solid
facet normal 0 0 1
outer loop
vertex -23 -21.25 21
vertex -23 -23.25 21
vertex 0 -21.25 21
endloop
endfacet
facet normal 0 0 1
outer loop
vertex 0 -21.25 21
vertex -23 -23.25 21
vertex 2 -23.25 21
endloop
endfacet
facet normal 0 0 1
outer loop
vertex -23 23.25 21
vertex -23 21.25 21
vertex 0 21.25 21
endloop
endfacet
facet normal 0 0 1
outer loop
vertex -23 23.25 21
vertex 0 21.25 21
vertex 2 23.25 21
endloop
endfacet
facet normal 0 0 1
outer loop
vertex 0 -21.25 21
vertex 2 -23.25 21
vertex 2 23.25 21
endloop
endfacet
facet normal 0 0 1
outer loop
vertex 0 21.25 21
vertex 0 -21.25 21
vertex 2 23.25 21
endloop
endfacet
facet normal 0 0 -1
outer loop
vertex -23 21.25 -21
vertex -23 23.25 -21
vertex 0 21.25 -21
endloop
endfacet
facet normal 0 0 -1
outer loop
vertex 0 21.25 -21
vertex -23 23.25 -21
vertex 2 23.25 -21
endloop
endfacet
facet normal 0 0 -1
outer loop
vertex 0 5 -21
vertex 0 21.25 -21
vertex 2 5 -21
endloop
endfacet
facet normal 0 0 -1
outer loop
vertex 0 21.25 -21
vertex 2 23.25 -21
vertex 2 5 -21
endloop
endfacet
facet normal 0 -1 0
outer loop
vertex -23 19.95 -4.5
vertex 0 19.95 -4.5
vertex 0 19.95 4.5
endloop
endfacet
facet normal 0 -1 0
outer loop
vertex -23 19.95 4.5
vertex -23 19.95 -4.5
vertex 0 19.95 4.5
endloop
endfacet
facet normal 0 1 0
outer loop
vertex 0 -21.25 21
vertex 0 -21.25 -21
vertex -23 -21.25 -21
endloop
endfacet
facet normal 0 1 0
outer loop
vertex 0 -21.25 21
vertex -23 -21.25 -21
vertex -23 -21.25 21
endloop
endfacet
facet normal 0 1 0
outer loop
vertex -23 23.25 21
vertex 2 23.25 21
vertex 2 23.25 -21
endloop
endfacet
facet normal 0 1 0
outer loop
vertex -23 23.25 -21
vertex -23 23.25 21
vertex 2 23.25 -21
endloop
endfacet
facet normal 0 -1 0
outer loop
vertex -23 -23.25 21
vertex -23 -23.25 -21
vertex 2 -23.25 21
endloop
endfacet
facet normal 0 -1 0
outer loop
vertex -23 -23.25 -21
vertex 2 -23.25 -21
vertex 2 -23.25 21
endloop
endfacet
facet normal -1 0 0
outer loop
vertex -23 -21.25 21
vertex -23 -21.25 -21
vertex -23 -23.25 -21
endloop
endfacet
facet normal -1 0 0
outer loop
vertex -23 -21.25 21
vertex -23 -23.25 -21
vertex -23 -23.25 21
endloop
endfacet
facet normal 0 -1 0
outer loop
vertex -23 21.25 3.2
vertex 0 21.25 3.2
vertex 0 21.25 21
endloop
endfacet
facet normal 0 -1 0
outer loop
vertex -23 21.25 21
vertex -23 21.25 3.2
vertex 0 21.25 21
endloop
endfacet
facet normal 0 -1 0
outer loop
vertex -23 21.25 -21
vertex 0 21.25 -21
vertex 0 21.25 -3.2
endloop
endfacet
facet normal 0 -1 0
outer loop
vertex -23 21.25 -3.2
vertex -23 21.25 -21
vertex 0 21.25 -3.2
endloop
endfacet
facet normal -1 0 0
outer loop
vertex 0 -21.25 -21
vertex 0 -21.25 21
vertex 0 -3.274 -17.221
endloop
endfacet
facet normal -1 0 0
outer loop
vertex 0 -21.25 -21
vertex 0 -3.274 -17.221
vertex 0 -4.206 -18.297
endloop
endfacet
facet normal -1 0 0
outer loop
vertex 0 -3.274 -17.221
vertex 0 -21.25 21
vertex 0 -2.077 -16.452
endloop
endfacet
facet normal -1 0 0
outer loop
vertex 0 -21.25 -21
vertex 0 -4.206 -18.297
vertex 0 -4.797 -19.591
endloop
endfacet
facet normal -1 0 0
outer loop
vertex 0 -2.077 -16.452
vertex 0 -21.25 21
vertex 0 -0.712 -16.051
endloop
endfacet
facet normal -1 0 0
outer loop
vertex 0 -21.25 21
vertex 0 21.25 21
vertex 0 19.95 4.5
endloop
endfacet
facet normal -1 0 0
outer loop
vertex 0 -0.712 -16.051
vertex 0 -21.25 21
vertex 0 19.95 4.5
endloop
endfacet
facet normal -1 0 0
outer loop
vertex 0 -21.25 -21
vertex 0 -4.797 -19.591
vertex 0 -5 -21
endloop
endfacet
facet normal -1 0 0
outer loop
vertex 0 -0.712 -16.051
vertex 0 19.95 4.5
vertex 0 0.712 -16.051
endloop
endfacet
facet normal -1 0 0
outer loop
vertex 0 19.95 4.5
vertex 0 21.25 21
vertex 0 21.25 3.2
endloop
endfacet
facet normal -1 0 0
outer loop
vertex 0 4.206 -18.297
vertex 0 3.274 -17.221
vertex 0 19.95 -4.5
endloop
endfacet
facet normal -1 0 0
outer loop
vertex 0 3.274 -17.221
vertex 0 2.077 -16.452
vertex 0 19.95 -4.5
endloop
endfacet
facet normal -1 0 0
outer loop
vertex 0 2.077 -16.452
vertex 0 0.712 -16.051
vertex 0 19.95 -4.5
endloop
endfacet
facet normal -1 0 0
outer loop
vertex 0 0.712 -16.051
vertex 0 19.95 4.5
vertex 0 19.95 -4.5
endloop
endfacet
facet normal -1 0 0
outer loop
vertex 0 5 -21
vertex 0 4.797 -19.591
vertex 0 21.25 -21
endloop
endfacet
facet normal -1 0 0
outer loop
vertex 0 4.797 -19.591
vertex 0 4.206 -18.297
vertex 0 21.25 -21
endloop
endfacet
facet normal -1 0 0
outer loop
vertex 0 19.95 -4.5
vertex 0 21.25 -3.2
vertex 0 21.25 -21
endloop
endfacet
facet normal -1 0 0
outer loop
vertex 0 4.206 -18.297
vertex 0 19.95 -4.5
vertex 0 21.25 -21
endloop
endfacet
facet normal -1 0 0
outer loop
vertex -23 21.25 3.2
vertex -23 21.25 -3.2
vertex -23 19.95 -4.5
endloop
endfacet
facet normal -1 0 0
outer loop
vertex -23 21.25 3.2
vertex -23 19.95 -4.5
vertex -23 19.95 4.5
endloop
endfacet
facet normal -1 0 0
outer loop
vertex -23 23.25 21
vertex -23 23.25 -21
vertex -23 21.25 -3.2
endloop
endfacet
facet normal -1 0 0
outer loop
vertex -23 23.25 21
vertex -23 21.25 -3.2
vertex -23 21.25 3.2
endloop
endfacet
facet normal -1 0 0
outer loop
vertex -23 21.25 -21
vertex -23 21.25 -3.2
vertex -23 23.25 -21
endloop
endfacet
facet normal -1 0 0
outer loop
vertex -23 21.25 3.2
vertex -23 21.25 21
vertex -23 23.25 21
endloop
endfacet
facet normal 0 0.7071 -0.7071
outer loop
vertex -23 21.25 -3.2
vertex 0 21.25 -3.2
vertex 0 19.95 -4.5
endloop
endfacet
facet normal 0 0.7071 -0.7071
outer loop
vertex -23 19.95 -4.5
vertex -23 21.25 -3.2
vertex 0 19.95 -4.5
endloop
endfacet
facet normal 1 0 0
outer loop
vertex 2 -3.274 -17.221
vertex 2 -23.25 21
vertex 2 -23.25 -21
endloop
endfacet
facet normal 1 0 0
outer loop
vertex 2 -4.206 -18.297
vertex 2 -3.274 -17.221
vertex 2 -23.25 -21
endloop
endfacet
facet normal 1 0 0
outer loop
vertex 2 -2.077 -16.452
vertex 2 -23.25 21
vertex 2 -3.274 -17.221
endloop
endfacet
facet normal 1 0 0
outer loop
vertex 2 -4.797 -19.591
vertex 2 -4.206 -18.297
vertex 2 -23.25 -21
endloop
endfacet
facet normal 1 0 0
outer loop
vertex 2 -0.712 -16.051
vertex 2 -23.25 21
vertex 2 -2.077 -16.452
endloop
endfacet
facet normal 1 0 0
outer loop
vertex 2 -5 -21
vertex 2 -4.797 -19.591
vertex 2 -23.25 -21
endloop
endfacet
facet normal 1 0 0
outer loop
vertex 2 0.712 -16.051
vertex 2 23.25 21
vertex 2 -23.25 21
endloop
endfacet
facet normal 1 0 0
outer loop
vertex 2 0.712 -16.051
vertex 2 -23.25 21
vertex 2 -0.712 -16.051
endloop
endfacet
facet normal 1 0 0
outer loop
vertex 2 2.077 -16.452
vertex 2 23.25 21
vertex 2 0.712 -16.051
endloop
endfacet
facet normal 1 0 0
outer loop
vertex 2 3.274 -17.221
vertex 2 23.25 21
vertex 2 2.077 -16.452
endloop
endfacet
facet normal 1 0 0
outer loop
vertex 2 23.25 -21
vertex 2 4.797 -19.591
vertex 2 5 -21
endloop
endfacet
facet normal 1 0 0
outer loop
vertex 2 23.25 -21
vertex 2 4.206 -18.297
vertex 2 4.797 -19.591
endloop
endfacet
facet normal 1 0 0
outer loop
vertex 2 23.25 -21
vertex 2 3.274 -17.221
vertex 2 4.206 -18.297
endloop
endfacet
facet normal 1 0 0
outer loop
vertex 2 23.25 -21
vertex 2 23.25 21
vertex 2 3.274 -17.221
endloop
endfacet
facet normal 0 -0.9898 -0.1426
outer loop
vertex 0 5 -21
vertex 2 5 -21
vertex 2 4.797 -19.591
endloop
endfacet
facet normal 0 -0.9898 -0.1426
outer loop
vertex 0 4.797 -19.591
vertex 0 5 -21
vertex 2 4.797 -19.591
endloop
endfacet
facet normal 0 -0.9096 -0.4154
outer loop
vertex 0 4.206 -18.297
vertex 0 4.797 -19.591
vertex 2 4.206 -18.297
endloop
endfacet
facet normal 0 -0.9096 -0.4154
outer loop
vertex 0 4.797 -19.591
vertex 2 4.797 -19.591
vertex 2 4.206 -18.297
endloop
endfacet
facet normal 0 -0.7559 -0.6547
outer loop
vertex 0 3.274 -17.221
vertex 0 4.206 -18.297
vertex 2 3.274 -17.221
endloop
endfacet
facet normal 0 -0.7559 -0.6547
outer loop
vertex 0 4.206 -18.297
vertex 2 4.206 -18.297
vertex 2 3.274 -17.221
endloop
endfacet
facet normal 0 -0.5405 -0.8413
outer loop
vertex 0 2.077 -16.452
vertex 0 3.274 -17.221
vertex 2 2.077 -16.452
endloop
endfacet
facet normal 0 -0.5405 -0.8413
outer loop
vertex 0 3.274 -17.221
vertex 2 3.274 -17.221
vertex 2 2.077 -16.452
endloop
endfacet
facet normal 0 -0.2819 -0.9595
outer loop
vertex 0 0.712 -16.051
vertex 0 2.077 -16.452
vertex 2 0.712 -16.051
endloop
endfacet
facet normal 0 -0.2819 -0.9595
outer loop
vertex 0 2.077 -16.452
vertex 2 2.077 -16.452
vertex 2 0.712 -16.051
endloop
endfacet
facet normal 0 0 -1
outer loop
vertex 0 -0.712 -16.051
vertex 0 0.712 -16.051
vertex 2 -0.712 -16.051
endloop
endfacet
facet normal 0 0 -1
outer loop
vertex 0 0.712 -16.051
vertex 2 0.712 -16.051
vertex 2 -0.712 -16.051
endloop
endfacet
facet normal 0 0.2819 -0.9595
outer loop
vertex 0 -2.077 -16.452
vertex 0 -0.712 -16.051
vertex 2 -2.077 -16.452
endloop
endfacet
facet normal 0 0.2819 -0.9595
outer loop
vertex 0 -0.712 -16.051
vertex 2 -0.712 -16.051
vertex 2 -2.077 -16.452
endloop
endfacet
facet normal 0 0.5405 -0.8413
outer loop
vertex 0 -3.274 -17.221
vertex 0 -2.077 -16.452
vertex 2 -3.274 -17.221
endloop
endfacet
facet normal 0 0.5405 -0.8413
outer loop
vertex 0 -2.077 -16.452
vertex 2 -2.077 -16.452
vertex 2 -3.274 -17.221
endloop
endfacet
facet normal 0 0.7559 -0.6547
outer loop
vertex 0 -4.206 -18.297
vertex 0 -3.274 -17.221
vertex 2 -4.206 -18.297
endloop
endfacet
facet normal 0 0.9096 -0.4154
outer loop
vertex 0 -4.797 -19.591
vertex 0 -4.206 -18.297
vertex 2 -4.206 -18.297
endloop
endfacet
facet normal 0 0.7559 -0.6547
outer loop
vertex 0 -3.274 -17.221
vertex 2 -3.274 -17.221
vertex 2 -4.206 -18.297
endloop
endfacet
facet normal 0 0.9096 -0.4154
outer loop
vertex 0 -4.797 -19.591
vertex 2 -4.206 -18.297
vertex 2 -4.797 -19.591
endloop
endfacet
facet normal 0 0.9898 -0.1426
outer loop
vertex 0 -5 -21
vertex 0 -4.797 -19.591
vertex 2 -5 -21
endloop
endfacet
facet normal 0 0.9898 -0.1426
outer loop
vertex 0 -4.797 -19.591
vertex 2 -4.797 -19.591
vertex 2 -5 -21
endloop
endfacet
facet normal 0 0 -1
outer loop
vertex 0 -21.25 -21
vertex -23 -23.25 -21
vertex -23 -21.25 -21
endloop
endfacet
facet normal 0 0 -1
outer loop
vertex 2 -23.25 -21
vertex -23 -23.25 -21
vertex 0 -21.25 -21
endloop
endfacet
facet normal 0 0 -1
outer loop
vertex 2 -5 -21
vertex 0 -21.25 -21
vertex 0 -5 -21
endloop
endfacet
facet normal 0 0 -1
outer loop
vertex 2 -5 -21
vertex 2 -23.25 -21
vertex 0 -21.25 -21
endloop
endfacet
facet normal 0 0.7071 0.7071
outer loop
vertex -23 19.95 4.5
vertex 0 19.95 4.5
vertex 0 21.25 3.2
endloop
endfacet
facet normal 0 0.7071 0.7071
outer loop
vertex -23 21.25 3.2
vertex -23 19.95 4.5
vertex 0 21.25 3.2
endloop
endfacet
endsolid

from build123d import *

# Parameters (mm, degrees)
SKETCH1_W           = 42
SKETCH1_H           = 46.5
BOSS_EXTRUDE1_DEPTH = 2
SKETCH2_W           = 42
SKETCH2_H           = 2
BOSS_EXTRUDE2_DEPTH = 23
CUT_EXTRUDE1_DEPTH  = 23
BOSS_EXTRUDE3_DEPTH = 23


with BuildPart() as part:
    # Sketch1 → Boss-Extrude1 (new body)
    with BuildSketch(Plane(origin=(0, 0, 0), x_dir=(0, 0, -1), z_dir=(1, 0, 0))):
        Rectangle(SKETCH1_W, SKETCH1_H)
    extrude(amount=BOSS_EXTRUDE1_DEPTH)

    # Sketch2 → Boss-Extrude2 (add)
    with BuildSketch(Plane.ZY):
        with Locations((0, -22.25)):
            Rectangle(SKETCH2_W, SKETCH2_H)
    extrude(amount=BOSS_EXTRUDE2_DEPTH)

    # Sketch3 → Cut-Extrude1 (cut)
    with BuildSketch(Plane(origin=(2, 0, 0), x_dir=(0, 0, -1), z_dir=(1, 0, 0))):
        with BuildLine():
            Line((21, -5), (21, 5))
            ThreePointArc((21, 5), (16, 0), (21, -5))
        make_face()
    extrude(amount=-CUT_EXTRUDE1_DEPTH, mode=Mode.SUBTRACT)

    # Sketch4 → Boss-Extrude3 (add)
    with BuildSketch(Plane.ZY):
        Polygon((21, 23.25), (-21, 23.25), (-21, 21.25), (-3.2, 21.25), (-4.5, 19.95), (4.5, 19.95), (3.2, 21.25), (21, 21.25), align=None)
    extrude(amount=BOSS_EXTRUDE3_DEPTH)


solid = part.part
